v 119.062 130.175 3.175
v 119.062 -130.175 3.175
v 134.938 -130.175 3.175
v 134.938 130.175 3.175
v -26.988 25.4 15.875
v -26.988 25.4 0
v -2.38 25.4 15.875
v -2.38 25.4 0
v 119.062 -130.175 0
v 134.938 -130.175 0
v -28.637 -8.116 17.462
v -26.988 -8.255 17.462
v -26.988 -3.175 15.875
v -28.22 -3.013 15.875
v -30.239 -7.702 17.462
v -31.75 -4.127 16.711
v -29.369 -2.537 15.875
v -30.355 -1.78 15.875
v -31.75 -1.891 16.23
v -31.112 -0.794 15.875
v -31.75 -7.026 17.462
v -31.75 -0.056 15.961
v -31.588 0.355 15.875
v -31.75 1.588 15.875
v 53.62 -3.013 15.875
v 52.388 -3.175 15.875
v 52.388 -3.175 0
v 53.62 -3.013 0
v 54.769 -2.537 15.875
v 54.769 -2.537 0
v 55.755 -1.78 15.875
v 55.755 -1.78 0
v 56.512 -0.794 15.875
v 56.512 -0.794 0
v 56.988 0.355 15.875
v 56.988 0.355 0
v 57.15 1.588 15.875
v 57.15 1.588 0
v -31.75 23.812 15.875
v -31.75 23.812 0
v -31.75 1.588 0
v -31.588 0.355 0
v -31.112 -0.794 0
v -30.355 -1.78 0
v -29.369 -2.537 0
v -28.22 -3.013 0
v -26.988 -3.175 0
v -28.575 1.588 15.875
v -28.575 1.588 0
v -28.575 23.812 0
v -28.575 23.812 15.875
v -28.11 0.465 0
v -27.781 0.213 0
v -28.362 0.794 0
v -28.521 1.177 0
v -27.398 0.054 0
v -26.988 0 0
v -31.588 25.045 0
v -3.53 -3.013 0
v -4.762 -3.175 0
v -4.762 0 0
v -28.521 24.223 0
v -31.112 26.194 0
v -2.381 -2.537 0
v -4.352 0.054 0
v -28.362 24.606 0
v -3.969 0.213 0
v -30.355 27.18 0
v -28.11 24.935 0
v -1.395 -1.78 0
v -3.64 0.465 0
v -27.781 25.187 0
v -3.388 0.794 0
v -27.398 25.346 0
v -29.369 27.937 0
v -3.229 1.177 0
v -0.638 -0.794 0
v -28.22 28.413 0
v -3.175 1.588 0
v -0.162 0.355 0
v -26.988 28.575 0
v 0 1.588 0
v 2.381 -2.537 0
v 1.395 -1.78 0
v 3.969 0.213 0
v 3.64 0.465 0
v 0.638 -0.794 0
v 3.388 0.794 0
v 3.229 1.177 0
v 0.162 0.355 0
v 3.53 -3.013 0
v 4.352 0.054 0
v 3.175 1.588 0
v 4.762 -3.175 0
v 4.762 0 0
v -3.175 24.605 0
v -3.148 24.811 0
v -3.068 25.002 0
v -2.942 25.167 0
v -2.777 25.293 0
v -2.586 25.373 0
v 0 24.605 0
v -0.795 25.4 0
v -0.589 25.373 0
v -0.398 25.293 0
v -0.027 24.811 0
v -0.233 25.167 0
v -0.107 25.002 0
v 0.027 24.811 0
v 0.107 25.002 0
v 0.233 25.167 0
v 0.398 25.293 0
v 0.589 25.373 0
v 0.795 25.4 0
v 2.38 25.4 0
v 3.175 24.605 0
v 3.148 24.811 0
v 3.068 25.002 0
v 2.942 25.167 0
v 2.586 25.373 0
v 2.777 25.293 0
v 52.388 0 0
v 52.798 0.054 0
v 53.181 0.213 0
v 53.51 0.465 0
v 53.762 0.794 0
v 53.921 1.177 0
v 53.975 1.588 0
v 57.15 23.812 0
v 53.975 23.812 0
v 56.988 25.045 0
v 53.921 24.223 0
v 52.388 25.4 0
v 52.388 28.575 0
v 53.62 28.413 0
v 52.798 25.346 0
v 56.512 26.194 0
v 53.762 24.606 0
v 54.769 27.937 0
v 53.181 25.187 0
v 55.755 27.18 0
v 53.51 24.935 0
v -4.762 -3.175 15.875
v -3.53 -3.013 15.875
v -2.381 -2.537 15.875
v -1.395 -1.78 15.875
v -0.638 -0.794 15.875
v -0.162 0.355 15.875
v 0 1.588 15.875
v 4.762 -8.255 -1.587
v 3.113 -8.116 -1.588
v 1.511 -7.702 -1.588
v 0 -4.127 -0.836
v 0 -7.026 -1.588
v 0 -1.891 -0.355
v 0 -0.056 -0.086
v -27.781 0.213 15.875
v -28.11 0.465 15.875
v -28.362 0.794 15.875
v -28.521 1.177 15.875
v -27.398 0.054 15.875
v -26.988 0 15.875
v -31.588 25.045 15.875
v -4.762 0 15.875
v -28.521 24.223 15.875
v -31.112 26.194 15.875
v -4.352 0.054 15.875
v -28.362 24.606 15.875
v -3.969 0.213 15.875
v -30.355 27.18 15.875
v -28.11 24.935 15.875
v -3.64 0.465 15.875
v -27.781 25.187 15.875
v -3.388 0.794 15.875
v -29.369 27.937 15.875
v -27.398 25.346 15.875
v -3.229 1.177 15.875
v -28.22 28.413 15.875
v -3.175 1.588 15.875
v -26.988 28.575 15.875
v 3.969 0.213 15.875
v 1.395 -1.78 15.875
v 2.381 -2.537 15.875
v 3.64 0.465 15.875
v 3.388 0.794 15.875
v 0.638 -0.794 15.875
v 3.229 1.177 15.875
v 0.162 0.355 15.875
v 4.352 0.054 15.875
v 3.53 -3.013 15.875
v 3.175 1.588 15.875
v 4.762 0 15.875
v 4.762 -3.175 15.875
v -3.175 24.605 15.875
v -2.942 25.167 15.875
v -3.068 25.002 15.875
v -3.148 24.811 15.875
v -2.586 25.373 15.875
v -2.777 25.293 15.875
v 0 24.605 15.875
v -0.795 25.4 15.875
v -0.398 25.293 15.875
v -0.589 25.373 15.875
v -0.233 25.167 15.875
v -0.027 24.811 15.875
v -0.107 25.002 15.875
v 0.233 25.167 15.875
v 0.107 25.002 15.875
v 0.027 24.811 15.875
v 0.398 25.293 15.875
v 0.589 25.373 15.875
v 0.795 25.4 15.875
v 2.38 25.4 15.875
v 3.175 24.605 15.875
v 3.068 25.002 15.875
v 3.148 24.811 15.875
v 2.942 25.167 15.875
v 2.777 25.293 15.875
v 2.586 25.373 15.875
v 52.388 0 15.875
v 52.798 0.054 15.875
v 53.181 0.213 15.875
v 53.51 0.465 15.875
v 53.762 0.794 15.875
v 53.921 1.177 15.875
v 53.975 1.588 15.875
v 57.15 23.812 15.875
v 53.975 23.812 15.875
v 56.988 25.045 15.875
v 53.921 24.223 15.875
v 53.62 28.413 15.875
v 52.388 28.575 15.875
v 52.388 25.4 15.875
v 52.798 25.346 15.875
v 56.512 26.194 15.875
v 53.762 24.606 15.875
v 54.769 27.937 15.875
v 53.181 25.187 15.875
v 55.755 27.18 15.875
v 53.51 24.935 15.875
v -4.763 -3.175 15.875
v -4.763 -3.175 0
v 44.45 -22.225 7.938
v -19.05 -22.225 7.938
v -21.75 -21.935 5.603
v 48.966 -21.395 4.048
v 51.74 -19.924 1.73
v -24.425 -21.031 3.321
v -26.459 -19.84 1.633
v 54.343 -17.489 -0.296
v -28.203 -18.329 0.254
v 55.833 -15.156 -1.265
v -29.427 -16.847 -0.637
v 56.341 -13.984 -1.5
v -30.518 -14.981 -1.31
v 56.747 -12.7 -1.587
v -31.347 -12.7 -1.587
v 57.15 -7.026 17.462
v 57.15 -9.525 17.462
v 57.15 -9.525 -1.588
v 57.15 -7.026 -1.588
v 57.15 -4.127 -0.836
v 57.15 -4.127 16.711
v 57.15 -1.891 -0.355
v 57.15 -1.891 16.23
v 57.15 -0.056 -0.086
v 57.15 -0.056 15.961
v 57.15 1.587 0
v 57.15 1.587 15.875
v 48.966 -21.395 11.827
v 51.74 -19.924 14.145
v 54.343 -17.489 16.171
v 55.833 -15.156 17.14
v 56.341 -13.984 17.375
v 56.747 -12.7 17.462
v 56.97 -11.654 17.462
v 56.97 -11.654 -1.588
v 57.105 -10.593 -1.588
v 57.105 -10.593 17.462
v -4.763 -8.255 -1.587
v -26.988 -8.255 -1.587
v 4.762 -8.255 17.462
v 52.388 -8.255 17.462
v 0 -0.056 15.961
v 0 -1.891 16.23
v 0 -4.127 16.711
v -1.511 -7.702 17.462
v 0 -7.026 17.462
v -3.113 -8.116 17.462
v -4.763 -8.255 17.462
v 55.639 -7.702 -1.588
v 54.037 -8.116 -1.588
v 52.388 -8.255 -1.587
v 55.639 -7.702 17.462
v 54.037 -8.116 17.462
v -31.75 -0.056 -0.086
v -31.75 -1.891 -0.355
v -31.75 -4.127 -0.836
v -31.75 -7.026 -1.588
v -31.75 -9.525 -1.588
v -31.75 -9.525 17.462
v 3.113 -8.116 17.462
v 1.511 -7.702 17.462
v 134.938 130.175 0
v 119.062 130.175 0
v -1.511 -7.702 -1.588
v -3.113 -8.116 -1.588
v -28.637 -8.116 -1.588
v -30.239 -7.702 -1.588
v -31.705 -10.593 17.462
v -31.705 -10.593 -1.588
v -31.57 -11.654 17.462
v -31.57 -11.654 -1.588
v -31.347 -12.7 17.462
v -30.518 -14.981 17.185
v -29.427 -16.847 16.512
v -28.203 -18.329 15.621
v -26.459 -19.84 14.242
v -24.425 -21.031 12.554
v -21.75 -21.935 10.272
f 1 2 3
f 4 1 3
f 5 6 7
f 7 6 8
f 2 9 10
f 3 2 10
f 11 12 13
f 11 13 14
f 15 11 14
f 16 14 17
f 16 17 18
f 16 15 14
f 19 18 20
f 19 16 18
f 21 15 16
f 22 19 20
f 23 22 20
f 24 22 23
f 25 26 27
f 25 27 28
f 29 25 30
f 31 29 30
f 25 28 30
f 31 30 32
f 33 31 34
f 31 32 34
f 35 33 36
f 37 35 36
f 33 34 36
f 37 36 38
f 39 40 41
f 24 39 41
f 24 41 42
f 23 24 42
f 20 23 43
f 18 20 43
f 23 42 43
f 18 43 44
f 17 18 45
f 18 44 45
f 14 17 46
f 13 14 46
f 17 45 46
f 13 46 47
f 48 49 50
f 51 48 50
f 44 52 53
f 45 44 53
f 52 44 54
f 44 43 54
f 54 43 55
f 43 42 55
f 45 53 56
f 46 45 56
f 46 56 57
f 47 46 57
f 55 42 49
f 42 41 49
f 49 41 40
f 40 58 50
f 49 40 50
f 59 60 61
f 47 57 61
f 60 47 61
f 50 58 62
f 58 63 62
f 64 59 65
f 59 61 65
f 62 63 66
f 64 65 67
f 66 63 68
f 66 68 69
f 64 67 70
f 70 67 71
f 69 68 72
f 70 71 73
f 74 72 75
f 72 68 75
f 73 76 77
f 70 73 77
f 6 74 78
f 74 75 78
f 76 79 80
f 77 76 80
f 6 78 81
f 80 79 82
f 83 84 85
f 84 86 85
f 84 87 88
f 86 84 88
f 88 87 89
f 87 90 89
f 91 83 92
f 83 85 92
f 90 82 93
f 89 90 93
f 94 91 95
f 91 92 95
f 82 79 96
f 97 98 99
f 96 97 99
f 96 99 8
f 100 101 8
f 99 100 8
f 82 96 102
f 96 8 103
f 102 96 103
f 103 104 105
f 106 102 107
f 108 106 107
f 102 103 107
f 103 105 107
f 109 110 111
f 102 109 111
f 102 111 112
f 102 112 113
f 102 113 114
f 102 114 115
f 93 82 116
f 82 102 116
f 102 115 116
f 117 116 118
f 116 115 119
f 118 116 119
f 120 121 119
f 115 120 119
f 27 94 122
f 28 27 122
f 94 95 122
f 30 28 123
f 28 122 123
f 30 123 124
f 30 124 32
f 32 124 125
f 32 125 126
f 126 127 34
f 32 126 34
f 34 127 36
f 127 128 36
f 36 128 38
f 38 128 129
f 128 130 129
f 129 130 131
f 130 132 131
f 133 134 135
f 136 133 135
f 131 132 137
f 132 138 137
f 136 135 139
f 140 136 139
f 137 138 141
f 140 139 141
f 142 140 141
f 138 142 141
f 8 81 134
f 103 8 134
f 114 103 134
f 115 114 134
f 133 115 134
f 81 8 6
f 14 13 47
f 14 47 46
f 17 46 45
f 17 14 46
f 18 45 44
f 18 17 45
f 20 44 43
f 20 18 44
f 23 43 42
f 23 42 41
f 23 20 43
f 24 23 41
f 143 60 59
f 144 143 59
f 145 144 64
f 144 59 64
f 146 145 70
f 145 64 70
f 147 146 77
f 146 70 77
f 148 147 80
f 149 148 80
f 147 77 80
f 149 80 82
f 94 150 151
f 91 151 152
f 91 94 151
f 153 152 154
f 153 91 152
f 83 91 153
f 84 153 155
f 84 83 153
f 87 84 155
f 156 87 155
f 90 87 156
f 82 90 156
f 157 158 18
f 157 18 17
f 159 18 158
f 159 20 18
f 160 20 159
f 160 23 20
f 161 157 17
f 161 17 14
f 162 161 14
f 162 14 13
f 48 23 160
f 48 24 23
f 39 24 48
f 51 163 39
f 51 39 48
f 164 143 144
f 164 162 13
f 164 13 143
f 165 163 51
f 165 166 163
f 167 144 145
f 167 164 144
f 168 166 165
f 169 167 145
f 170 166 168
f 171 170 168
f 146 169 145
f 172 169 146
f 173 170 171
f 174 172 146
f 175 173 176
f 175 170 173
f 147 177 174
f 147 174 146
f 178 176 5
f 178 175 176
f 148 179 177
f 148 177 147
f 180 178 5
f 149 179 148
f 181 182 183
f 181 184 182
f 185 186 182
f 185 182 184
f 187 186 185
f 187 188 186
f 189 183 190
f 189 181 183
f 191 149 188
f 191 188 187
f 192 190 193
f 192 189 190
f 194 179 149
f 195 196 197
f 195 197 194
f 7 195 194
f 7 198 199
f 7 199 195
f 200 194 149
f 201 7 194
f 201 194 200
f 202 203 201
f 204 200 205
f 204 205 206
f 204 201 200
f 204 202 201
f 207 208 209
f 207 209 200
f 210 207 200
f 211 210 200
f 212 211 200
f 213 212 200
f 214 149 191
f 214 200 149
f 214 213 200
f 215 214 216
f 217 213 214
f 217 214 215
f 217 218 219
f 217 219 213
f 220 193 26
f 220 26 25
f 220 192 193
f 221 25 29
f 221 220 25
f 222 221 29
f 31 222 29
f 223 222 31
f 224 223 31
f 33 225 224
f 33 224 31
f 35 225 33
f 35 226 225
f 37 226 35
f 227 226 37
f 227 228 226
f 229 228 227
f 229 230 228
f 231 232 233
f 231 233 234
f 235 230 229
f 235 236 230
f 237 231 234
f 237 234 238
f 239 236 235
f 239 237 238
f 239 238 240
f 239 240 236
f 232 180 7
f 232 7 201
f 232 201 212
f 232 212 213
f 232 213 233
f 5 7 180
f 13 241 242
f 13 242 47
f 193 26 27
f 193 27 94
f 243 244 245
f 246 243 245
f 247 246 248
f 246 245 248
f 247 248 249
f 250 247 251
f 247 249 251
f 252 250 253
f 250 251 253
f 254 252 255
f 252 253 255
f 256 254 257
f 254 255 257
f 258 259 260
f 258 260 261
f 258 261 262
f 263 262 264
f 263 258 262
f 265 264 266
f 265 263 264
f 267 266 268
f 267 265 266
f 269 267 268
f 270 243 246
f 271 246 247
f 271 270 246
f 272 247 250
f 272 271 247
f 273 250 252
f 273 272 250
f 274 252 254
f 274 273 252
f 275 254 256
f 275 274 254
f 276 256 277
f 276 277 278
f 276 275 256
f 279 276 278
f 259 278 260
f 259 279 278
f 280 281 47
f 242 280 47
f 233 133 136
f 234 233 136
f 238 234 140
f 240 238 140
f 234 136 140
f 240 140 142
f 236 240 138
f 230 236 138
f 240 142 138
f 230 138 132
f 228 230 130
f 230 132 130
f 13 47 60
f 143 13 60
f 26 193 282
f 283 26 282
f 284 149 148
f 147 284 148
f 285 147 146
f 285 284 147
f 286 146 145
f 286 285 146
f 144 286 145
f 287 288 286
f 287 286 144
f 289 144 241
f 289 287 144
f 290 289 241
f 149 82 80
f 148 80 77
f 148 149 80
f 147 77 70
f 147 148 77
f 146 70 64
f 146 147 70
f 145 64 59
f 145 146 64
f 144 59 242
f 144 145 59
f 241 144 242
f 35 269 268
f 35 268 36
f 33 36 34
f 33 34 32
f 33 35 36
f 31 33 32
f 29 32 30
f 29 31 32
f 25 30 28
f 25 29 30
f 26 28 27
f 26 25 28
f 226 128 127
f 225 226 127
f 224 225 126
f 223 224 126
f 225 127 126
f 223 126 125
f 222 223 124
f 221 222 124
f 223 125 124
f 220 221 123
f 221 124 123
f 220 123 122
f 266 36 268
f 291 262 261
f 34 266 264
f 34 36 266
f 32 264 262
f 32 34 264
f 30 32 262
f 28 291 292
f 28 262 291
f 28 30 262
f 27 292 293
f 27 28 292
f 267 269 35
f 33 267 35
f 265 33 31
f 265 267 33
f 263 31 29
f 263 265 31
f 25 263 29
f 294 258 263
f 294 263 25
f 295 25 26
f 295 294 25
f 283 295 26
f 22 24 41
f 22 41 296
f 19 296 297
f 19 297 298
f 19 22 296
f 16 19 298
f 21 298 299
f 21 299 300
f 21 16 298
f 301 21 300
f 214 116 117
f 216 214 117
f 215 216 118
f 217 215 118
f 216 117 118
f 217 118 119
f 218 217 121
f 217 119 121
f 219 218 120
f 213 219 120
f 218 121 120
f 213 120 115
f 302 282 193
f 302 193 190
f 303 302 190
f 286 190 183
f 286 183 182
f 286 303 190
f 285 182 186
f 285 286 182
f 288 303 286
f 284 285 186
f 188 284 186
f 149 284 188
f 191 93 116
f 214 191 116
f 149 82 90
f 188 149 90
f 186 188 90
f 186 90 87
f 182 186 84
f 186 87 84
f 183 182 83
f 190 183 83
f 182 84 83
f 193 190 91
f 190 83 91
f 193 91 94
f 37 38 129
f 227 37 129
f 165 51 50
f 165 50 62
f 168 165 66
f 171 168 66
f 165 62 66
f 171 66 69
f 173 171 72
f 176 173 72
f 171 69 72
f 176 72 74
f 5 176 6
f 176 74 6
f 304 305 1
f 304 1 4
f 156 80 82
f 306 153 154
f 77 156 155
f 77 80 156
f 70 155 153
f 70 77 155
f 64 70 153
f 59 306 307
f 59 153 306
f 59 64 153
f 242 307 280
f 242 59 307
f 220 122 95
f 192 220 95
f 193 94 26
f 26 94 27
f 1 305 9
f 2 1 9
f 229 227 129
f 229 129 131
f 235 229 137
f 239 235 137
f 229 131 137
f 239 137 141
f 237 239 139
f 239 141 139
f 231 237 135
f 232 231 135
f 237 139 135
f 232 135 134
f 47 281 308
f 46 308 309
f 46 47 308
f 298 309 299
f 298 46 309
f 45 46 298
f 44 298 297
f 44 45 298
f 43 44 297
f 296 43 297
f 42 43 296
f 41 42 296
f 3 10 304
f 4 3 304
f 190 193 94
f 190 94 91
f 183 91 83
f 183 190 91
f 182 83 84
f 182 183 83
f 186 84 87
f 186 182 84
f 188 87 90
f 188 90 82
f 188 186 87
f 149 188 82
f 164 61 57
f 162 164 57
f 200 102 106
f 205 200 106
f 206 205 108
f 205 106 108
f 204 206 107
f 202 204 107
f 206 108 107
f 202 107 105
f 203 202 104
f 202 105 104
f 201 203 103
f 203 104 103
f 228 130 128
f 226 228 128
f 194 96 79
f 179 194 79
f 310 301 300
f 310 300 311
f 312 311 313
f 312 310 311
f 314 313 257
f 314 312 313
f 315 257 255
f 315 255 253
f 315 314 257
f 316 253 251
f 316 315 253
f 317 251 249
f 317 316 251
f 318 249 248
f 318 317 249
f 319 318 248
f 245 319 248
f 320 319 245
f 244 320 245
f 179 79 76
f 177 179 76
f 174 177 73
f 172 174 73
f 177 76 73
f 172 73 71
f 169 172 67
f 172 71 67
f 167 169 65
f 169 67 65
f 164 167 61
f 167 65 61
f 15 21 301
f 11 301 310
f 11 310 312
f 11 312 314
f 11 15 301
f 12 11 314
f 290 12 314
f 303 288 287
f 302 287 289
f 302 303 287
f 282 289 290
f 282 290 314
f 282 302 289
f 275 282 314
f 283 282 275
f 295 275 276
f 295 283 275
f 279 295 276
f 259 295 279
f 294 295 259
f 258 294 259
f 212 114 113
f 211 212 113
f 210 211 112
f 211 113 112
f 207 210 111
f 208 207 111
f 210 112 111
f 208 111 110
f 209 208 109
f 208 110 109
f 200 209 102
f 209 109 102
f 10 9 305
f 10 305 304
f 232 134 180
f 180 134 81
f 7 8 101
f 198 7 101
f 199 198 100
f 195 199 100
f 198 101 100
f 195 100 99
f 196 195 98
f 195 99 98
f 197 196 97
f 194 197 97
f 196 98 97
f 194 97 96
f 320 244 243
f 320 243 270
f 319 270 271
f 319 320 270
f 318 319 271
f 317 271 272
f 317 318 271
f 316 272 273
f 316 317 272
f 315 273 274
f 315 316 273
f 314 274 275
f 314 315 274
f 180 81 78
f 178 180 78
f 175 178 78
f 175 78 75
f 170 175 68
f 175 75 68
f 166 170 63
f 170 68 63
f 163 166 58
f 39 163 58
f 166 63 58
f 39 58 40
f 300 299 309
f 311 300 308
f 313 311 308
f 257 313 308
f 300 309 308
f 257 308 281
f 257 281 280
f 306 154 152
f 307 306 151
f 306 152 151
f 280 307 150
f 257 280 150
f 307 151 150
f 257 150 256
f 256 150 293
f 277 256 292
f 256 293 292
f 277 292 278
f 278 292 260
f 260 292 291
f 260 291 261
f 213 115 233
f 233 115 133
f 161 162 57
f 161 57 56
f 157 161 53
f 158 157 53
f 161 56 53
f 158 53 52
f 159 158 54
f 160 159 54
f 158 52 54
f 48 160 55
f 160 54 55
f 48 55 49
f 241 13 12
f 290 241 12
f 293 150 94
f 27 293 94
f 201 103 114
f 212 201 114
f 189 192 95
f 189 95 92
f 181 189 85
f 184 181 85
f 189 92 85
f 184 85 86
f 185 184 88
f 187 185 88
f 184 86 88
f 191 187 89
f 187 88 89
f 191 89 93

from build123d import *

# Parameters (mm, degrees)
F1_DEPTH      = 15.875
F3_DEPTH      = 17.4625
F3_DEPTH_BACK = 1.5875
F4_T1_DEPTH   = 22.225
F4_T3_DEPTH   = 47.625
F4_T6_ANGLE   = 248.6962956801
F4_T8_ANGLE   = 248.6962956801
F4_T10_ANGLE  = 248.6962956801
F4_T12_ANGLE  = 248.6962956801
F4_T14_ANGLE  = 248.6962956801
F4_T16_ANGLE  = 248.6962956801
F4_T18_ANGLE  = 248.6962956801
F4_T20_ANGLE  = 248.6962956801
F6_T1_DEPTH   = 111.125
F7_W          = 15.875
F7_H          = 25.4
F7_H_2        = 82.55
F7_H_3        = 50.8
F8_DEPTH      = 3.175


# Not quite as in the source:
# - a fillet or chamfer that OpenCascade refuses, or shapes differently, is made with other operations: its cross-section is extruded or revolved along the edge and cut away or added
# - two fillets or chamfers of one size are made in one step
# - the program builds the solid bodies; features that only make, move or delete a surface that nothing else refers to are left out


with BuildPart() as f1:
    # F0 (on Top) → F1 (new body)
    with BuildSketch(Plane.XY):
        with BuildLine():
            ThreePointArc((-4.7625, -3.175), (-1.3949039546, -1.7800960454), (0, 1.5875))
            ThreePointArc((0, 1.5875), (1.3949039546, -1.7800960454), (4.7625, -3.175))
            Line((4.7625, -3.175), (52.3875, -3.175))
            ThreePointArc((52.3875, -3.175), (55.7550960454, -1.7800960454), (57.15, 1.5875))
            Line((57.15, 1.5875), (57.15, 23.8125))
            ThreePointArc((57.15, 23.8125), (55.7550960454, 27.1800960454), (52.3875, 28.575))
            Line((52.3875, 28.575), (-26.9875, 28.575))
            ThreePointArc((-26.9875, 28.575), (-30.3550960454, 27.1800960454), (-31.75, 23.8125))
            Line((-31.75, 23.8125), (-31.75, 1.5875))
            ThreePointArc((-31.75, 1.5875), (-30.3550960454, -1.7800960454), (-26.9875, -3.175))
            Line((-26.9875, -3.175), (-4.7625, -3.175))
        make_face()
        with BuildLine():
            Line((-4.7625, 0), (-26.9875, 0))
            ThreePointArc((-26.9875, 0), (-28.1100320151, 0.4649679849), (-28.575, 1.5875))
            Line((-28.575, 1.5875), (-28.575, 23.8125))
            ThreePointArc((-28.575, 23.8125), (-28.1100320151, 24.9350320151), (-26.9875, 25.4))
            Line((-26.9875, 25.4), (-2.37998, 25.4))
            ThreePointArc((-2.37998, 25.4), (-2.9421440332, 25.1671440332), (-3.175, 24.60498))
            Line((-3.175, 24.60498), (-3.175, 1.5875))
            ThreePointArc((-3.175, 1.5875), (-3.6399679849, 0.4649679849), (-4.7625, 0))
        make_face(mode=Mode.SUBTRACT)
        with BuildLine():
            ThreePointArc((0, 24.60498), (-0.2328559668, 25.1671440332), (-0.79502, 25.4))
            Line((-0.79502, 25.4), (0.79502, 25.4))
            ThreePointArc((0.79502, 25.4), (0.2328559668, 25.1671440332), (0, 24.60498))
        make_face(mode=Mode.SUBTRACT)
        with BuildLine():
            ThreePointArc((3.175, 24.60498), (2.9421440332, 25.1671440332), (2.37998, 25.4))
            Line((2.37998, 25.4), (52.3875, 25.4))
            ThreePointArc((52.3875, 25.4), (53.5100320151, 24.9350320151), (53.975, 23.8125))
            Line((53.975, 23.8125), (53.975, 1.5875))
            ThreePointArc((53.975, 1.5875), (53.5100320151, 0.4649679849), (52.3875, 0))
            Line((52.3875, 0), (4.7625, 0))
            ThreePointArc((4.7625, 0), (3.6399679849, 0.4649679849), (3.175, 1.5875))
            Line((3.175, 1.5875), (3.175, 24.60498))
        make_face(mode=Mode.SUBTRACT)
    extrude(amount=F1_DEPTH)


with BuildPart() as f3:
    # F0 (on Top) → F3 (new body, two sides)
    with BuildSketch(Plane.XY) as f3_sk:
        with BuildLine():
            Line((52.3875, -3.175), (4.7625, -3.175))
            Line((4.7625, -3.175), (-4.7625, -3.175))
            Line((-4.7625, -3.175), (-26.9875, -3.175))
            Line((-26.9875, -3.175), (-31.75, -3.175))
            Line((-31.75, -3.175), (-31.75, -9.525))
            ThreePointArc((-31.75, -9.525), (-28.0302561211, -18.5052561211), (-19.05, -22.225))
            Line((-19.05, -22.225), (44.45, -22.225))
            ThreePointArc((44.45, -22.225), (53.4302561211, -18.5052561211), (57.15, -9.525))
            Line((57.15, -9.525), (57.15, -3.175))
            Line((57.15, -3.175), (52.3875, -3.175))
        make_face()
        with BuildLine():
            ThreePointArc((4.7625, -3.175), (1.3949039546, -1.7800960454), (0, 1.5875))
            ThreePointArc((0, 1.5875), (-1.3949039546, -1.7800960454), (-4.7625, -3.175))
            Line((-4.7625, -3.175), (4.7625, -3.175))
        make_face()
        with BuildLine():
            ThreePointArc((57.15, 1.5875), (55.7550960454, -1.7800960454), (52.3875, -3.175))
            Line((52.3875, -3.175), (57.15, -3.175))
            Line((57.15, -3.175), (57.15, 1.5875))
        make_face()
        with BuildLine():
            Line((-31.75, -3.175), (-26.9875, -3.175))
            ThreePointArc((-26.9875, -3.175), (-30.3550960454, -1.7800960454), (-31.75, 1.5875))
            Line((-31.75, 1.5875), (-31.75, -3.175))
        make_face()
    extrude(amount=F3_DEPTH)
    extrude(f3_sk.sketch, amount=-F3_DEPTH_BACK)

    # F4: chamfer of 1.5875 x 5.08 on 8 edges, made by hand

    # F4_s2 → F4_t1 (cut)
    with BuildSketch(Plane.YZ.offset(-26.9875)):
        Polygon((-3.175, 15.875), (-8.255, 17.4625), (-3.175, 17.4625), align=None)
        Polygon((-8.255, -1.5875), (-3.175, 0), (-3.175, -1.5875), align=None)
    extrude(amount=F4_T1_DEPTH, mode=Mode.SUBTRACT)

    # F4_s4 → F4_t3 (cut)
    with BuildSketch(Plane.YZ.offset(4.7625)):
        Polygon((-3.175, 15.875), (-8.255, 17.4625), (-3.175, 17.4625), align=None)
        Polygon((-8.255, -1.5875), (-3.175, 0), (-3.175, -1.5875), align=None)
    extrude(amount=F4_T3_DEPTH, mode=Mode.SUBTRACT)

    # F4_s5 → F4_t6 (revolve, cut)
    with BuildSketch(Plane.YZ.offset(-26.9875)):
        Polygon((-3.175, 15.875), (-8.255, 17.4625), (-3.175, 17.4625), align=None)
    revolve(axis=Axis((-26.9875, 1.5875, 17.4625), (0, 0, -1)), revolution_arc=F4_T6_ANGLE, mode=Mode.SUBTRACT)

    # F4_s7 → F4_t8 (revolve, cut)
    with BuildSketch(Plane.YZ.offset(4.7625)):
        Polygon((-3.175, 15.875), (-8.255, 17.4625), (-3.175, 17.4625), align=None)
    revolve(axis=Axis((4.7625, 1.5875, 17.4625), (0, 0, -1)), revolution_arc=F4_T8_ANGLE, mode=Mode.SUBTRACT)

    # F4_s9 → F4_t10 (revolve, cut)
    with BuildSketch(Plane(origin=(-0.0912813949, -0.2340799532, 0), x_dir=(0, 0, 1), z_dir=(-0.363311466, -0.9316677405, 0))):
        Polygon((15.875, 9.7763245664), (17.4625, 14.8563245664), (17.4625, 9.7763245664), align=None)
    revolve(axis=Axis((-4.7625, 1.5875, 17.4625), (0, 0, -1)), revolution_arc=F4_T10_ANGLE, mode=Mode.SUBTRACT)

    # F4_s11 → F4_t12 (revolve, cut)
    with BuildSketch(Plane(origin=(7.452245502, 19.1103705201, 0), x_dir=(0, 0, 1), z_dir=(-0.363311466, -0.9316677405, 0))):
        Polygon((15.875, -43.4684868037), (17.4625, -38.3884868037), (17.4625, -43.4684868037), align=None)
    revolve(axis=Axis((52.3875, 1.5875, 17.4625), (0, 0, -1)), revolution_arc=F4_T12_ANGLE, mode=Mode.SUBTRACT)

    # F4_s13 → F4_t14 (revolve, cut)
    with BuildSketch(Plane(origin=(-0.0912813949, -0.2340799532, 0), x_dir=(0, 0, 1), z_dir=(-0.363311466, -0.9316677405, 0))):
        Polygon((-1.5875, 14.8563245664), (0, 9.7763245664), (-1.5875, 9.7763245664), align=None)
    revolve(axis=Axis((-4.7625, 1.5875, -1.5875), (0, 0, -1)), revolution_arc=F4_T14_ANGLE, mode=Mode.SUBTRACT)

    # F4_s15 → F4_t16 (revolve, cut)
    with BuildSketch(Plane.YZ.offset(-26.9875)):
        Polygon((-8.255, -1.5875), (-3.175, 0), (-3.175, -1.5875), align=None)
    revolve(axis=Axis((-26.9875, 1.5875, -1.5875), (0, 0, -1)), revolution_arc=F4_T16_ANGLE, mode=Mode.SUBTRACT)

    # F4_s17 → F4_t18 (revolve, cut)
    with BuildSketch(Plane(origin=(7.452245502, 19.1103705201, 0), x_dir=(0, 0, 1), z_dir=(-0.363311466, -0.9316677405, 0))):
        Polygon((-1.5875, -38.3884868037), (0, -43.4684868037), (-1.5875, -43.4684868037), align=None)
    revolve(axis=Axis((52.3875, 1.5875, -1.5875), (0, 0, -1)), revolution_arc=F4_T18_ANGLE, mode=Mode.SUBTRACT)

    # F4_s19 → F4_t20 (revolve, cut)
    with BuildSketch(Plane.YZ.offset(4.7625)):
        Polygon((-8.255, -1.5875), (-3.175, 0), (-3.175, -1.5875), align=None)
    revolve(axis=Axis((4.7625, 1.5875, -1.5875), (0, 0, -1)), revolution_arc=F4_T20_ANGLE, mode=Mode.SUBTRACT)

    # F6: fillet of radius 9.525 on 4 edges, made by hand

    # F6_s2 → F6_t1 (cut)
    with BuildSketch(Plane.YZ.offset(-42.8625)):
        with BuildLine():
            ThreePointArc((-22.225, 7.9375), (-19.4351920908, 14.6726920908), (-12.7, 17.4625))
            Line((-12.7, 17.4625), (-22.225, 17.4625))
            Line((-22.225, 17.4625), (-22.225, 7.9375))
        make_face()
        with BuildLine():
            ThreePointArc((-22.225, 7.9375), (-19.4351920908, 1.2023079092), (-12.7, -1.5875))
            Line((-12.7, -1.5875), (-22.225, -1.5875))
            Line((-22.225, -1.5875), (-22.225, 7.9375))
        make_face()
    extrude(amount=F6_T1_DEPTH, mode=Mode.SUBTRACT)


with BuildPart() as f8:
    # F7 (on Top) → F8 (new body)
    with BuildSketch(Plane.XY):
        with Locations((127, -117.475)):
            Rectangle(F7_W, F7_H)
        with Locations((127, -92.075)):
            Rectangle(F7_W, F7_H)
        with Locations((127, -66.675)):
            Rectangle(F7_W, F7_H)
        with Locations((127, -12.7)):
            Rectangle(F7_W, F7_H_2)
        with Locations((127, 41.275)):
            Rectangle(F7_W, F7_H)
        with Locations((127, 79.375)):
            Rectangle(F7_W, F7_H_3)
        with Locations((127, 117.475)):
            Rectangle(F7_W, F7_H)
    extrude(amount=F8_DEPTH)


solid = Compound([f1.part, f3.part, f8.part])
